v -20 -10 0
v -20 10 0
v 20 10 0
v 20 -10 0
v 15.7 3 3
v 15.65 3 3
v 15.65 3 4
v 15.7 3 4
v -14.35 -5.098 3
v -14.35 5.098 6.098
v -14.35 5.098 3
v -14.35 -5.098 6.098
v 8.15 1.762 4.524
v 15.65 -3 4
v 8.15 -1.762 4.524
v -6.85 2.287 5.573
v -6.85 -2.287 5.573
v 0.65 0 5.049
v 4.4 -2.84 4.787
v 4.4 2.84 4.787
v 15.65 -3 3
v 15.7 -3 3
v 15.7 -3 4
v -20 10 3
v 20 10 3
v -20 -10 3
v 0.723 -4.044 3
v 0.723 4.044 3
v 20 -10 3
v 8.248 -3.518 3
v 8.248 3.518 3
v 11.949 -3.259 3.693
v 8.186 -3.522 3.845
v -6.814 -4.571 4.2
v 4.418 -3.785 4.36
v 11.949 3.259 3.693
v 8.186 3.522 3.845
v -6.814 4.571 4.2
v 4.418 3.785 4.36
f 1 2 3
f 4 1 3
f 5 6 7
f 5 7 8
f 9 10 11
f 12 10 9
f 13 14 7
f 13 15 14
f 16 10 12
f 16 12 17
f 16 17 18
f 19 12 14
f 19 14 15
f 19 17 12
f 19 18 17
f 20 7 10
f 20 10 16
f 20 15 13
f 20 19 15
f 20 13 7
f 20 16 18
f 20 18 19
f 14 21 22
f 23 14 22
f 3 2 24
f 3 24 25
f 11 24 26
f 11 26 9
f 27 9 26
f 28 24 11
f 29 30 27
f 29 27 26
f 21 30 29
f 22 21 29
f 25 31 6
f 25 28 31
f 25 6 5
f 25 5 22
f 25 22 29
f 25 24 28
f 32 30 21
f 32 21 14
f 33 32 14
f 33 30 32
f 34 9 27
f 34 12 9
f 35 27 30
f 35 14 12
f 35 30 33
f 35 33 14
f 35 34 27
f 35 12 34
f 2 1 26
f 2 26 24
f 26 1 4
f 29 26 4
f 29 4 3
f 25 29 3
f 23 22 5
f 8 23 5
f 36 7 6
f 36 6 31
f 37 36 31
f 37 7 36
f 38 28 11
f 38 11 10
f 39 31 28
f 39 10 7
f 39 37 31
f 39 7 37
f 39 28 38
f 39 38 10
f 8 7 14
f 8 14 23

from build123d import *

# Parameters (mm, degrees)
F0_W      = 40
F0_H      = 20
F1_DEPTH  = 3
F2_W      = 0.05
F2_H      = 6
F3_DEPTH  = 1
F3_FACE_W = 6
F3_FACE_H = 1
F4_DEPTH  = 30
F4_TAPER  = -4


with BuildPart() as f1:
    # F0 (on Top) → F1 (new body)
    with BuildSketch(Plane.XY):
        Rectangle(F0_W, F0_H)
    extrude(amount=F1_DEPTH)

    # F2 (on face) → F3 (join)
    with BuildSketch(Plane.XY.offset(3)):
        with Locations((15.67463018, 0)):
            Rectangle(F2_W, F2_H)
    extrude(amount=F3_DEPTH)

    # F3_face (on face) → F4 (join)
    with BuildSketch(Plane(origin=(15.64963018, 0, 3.5), x_dir=(0, -1, 0), z_dir=(-1, 0, 0))):
        Rectangle(F3_FACE_W, F3_FACE_H)
    extrude(amount=F4_DEPTH, taper=F4_TAPER)


solid = f1.part
